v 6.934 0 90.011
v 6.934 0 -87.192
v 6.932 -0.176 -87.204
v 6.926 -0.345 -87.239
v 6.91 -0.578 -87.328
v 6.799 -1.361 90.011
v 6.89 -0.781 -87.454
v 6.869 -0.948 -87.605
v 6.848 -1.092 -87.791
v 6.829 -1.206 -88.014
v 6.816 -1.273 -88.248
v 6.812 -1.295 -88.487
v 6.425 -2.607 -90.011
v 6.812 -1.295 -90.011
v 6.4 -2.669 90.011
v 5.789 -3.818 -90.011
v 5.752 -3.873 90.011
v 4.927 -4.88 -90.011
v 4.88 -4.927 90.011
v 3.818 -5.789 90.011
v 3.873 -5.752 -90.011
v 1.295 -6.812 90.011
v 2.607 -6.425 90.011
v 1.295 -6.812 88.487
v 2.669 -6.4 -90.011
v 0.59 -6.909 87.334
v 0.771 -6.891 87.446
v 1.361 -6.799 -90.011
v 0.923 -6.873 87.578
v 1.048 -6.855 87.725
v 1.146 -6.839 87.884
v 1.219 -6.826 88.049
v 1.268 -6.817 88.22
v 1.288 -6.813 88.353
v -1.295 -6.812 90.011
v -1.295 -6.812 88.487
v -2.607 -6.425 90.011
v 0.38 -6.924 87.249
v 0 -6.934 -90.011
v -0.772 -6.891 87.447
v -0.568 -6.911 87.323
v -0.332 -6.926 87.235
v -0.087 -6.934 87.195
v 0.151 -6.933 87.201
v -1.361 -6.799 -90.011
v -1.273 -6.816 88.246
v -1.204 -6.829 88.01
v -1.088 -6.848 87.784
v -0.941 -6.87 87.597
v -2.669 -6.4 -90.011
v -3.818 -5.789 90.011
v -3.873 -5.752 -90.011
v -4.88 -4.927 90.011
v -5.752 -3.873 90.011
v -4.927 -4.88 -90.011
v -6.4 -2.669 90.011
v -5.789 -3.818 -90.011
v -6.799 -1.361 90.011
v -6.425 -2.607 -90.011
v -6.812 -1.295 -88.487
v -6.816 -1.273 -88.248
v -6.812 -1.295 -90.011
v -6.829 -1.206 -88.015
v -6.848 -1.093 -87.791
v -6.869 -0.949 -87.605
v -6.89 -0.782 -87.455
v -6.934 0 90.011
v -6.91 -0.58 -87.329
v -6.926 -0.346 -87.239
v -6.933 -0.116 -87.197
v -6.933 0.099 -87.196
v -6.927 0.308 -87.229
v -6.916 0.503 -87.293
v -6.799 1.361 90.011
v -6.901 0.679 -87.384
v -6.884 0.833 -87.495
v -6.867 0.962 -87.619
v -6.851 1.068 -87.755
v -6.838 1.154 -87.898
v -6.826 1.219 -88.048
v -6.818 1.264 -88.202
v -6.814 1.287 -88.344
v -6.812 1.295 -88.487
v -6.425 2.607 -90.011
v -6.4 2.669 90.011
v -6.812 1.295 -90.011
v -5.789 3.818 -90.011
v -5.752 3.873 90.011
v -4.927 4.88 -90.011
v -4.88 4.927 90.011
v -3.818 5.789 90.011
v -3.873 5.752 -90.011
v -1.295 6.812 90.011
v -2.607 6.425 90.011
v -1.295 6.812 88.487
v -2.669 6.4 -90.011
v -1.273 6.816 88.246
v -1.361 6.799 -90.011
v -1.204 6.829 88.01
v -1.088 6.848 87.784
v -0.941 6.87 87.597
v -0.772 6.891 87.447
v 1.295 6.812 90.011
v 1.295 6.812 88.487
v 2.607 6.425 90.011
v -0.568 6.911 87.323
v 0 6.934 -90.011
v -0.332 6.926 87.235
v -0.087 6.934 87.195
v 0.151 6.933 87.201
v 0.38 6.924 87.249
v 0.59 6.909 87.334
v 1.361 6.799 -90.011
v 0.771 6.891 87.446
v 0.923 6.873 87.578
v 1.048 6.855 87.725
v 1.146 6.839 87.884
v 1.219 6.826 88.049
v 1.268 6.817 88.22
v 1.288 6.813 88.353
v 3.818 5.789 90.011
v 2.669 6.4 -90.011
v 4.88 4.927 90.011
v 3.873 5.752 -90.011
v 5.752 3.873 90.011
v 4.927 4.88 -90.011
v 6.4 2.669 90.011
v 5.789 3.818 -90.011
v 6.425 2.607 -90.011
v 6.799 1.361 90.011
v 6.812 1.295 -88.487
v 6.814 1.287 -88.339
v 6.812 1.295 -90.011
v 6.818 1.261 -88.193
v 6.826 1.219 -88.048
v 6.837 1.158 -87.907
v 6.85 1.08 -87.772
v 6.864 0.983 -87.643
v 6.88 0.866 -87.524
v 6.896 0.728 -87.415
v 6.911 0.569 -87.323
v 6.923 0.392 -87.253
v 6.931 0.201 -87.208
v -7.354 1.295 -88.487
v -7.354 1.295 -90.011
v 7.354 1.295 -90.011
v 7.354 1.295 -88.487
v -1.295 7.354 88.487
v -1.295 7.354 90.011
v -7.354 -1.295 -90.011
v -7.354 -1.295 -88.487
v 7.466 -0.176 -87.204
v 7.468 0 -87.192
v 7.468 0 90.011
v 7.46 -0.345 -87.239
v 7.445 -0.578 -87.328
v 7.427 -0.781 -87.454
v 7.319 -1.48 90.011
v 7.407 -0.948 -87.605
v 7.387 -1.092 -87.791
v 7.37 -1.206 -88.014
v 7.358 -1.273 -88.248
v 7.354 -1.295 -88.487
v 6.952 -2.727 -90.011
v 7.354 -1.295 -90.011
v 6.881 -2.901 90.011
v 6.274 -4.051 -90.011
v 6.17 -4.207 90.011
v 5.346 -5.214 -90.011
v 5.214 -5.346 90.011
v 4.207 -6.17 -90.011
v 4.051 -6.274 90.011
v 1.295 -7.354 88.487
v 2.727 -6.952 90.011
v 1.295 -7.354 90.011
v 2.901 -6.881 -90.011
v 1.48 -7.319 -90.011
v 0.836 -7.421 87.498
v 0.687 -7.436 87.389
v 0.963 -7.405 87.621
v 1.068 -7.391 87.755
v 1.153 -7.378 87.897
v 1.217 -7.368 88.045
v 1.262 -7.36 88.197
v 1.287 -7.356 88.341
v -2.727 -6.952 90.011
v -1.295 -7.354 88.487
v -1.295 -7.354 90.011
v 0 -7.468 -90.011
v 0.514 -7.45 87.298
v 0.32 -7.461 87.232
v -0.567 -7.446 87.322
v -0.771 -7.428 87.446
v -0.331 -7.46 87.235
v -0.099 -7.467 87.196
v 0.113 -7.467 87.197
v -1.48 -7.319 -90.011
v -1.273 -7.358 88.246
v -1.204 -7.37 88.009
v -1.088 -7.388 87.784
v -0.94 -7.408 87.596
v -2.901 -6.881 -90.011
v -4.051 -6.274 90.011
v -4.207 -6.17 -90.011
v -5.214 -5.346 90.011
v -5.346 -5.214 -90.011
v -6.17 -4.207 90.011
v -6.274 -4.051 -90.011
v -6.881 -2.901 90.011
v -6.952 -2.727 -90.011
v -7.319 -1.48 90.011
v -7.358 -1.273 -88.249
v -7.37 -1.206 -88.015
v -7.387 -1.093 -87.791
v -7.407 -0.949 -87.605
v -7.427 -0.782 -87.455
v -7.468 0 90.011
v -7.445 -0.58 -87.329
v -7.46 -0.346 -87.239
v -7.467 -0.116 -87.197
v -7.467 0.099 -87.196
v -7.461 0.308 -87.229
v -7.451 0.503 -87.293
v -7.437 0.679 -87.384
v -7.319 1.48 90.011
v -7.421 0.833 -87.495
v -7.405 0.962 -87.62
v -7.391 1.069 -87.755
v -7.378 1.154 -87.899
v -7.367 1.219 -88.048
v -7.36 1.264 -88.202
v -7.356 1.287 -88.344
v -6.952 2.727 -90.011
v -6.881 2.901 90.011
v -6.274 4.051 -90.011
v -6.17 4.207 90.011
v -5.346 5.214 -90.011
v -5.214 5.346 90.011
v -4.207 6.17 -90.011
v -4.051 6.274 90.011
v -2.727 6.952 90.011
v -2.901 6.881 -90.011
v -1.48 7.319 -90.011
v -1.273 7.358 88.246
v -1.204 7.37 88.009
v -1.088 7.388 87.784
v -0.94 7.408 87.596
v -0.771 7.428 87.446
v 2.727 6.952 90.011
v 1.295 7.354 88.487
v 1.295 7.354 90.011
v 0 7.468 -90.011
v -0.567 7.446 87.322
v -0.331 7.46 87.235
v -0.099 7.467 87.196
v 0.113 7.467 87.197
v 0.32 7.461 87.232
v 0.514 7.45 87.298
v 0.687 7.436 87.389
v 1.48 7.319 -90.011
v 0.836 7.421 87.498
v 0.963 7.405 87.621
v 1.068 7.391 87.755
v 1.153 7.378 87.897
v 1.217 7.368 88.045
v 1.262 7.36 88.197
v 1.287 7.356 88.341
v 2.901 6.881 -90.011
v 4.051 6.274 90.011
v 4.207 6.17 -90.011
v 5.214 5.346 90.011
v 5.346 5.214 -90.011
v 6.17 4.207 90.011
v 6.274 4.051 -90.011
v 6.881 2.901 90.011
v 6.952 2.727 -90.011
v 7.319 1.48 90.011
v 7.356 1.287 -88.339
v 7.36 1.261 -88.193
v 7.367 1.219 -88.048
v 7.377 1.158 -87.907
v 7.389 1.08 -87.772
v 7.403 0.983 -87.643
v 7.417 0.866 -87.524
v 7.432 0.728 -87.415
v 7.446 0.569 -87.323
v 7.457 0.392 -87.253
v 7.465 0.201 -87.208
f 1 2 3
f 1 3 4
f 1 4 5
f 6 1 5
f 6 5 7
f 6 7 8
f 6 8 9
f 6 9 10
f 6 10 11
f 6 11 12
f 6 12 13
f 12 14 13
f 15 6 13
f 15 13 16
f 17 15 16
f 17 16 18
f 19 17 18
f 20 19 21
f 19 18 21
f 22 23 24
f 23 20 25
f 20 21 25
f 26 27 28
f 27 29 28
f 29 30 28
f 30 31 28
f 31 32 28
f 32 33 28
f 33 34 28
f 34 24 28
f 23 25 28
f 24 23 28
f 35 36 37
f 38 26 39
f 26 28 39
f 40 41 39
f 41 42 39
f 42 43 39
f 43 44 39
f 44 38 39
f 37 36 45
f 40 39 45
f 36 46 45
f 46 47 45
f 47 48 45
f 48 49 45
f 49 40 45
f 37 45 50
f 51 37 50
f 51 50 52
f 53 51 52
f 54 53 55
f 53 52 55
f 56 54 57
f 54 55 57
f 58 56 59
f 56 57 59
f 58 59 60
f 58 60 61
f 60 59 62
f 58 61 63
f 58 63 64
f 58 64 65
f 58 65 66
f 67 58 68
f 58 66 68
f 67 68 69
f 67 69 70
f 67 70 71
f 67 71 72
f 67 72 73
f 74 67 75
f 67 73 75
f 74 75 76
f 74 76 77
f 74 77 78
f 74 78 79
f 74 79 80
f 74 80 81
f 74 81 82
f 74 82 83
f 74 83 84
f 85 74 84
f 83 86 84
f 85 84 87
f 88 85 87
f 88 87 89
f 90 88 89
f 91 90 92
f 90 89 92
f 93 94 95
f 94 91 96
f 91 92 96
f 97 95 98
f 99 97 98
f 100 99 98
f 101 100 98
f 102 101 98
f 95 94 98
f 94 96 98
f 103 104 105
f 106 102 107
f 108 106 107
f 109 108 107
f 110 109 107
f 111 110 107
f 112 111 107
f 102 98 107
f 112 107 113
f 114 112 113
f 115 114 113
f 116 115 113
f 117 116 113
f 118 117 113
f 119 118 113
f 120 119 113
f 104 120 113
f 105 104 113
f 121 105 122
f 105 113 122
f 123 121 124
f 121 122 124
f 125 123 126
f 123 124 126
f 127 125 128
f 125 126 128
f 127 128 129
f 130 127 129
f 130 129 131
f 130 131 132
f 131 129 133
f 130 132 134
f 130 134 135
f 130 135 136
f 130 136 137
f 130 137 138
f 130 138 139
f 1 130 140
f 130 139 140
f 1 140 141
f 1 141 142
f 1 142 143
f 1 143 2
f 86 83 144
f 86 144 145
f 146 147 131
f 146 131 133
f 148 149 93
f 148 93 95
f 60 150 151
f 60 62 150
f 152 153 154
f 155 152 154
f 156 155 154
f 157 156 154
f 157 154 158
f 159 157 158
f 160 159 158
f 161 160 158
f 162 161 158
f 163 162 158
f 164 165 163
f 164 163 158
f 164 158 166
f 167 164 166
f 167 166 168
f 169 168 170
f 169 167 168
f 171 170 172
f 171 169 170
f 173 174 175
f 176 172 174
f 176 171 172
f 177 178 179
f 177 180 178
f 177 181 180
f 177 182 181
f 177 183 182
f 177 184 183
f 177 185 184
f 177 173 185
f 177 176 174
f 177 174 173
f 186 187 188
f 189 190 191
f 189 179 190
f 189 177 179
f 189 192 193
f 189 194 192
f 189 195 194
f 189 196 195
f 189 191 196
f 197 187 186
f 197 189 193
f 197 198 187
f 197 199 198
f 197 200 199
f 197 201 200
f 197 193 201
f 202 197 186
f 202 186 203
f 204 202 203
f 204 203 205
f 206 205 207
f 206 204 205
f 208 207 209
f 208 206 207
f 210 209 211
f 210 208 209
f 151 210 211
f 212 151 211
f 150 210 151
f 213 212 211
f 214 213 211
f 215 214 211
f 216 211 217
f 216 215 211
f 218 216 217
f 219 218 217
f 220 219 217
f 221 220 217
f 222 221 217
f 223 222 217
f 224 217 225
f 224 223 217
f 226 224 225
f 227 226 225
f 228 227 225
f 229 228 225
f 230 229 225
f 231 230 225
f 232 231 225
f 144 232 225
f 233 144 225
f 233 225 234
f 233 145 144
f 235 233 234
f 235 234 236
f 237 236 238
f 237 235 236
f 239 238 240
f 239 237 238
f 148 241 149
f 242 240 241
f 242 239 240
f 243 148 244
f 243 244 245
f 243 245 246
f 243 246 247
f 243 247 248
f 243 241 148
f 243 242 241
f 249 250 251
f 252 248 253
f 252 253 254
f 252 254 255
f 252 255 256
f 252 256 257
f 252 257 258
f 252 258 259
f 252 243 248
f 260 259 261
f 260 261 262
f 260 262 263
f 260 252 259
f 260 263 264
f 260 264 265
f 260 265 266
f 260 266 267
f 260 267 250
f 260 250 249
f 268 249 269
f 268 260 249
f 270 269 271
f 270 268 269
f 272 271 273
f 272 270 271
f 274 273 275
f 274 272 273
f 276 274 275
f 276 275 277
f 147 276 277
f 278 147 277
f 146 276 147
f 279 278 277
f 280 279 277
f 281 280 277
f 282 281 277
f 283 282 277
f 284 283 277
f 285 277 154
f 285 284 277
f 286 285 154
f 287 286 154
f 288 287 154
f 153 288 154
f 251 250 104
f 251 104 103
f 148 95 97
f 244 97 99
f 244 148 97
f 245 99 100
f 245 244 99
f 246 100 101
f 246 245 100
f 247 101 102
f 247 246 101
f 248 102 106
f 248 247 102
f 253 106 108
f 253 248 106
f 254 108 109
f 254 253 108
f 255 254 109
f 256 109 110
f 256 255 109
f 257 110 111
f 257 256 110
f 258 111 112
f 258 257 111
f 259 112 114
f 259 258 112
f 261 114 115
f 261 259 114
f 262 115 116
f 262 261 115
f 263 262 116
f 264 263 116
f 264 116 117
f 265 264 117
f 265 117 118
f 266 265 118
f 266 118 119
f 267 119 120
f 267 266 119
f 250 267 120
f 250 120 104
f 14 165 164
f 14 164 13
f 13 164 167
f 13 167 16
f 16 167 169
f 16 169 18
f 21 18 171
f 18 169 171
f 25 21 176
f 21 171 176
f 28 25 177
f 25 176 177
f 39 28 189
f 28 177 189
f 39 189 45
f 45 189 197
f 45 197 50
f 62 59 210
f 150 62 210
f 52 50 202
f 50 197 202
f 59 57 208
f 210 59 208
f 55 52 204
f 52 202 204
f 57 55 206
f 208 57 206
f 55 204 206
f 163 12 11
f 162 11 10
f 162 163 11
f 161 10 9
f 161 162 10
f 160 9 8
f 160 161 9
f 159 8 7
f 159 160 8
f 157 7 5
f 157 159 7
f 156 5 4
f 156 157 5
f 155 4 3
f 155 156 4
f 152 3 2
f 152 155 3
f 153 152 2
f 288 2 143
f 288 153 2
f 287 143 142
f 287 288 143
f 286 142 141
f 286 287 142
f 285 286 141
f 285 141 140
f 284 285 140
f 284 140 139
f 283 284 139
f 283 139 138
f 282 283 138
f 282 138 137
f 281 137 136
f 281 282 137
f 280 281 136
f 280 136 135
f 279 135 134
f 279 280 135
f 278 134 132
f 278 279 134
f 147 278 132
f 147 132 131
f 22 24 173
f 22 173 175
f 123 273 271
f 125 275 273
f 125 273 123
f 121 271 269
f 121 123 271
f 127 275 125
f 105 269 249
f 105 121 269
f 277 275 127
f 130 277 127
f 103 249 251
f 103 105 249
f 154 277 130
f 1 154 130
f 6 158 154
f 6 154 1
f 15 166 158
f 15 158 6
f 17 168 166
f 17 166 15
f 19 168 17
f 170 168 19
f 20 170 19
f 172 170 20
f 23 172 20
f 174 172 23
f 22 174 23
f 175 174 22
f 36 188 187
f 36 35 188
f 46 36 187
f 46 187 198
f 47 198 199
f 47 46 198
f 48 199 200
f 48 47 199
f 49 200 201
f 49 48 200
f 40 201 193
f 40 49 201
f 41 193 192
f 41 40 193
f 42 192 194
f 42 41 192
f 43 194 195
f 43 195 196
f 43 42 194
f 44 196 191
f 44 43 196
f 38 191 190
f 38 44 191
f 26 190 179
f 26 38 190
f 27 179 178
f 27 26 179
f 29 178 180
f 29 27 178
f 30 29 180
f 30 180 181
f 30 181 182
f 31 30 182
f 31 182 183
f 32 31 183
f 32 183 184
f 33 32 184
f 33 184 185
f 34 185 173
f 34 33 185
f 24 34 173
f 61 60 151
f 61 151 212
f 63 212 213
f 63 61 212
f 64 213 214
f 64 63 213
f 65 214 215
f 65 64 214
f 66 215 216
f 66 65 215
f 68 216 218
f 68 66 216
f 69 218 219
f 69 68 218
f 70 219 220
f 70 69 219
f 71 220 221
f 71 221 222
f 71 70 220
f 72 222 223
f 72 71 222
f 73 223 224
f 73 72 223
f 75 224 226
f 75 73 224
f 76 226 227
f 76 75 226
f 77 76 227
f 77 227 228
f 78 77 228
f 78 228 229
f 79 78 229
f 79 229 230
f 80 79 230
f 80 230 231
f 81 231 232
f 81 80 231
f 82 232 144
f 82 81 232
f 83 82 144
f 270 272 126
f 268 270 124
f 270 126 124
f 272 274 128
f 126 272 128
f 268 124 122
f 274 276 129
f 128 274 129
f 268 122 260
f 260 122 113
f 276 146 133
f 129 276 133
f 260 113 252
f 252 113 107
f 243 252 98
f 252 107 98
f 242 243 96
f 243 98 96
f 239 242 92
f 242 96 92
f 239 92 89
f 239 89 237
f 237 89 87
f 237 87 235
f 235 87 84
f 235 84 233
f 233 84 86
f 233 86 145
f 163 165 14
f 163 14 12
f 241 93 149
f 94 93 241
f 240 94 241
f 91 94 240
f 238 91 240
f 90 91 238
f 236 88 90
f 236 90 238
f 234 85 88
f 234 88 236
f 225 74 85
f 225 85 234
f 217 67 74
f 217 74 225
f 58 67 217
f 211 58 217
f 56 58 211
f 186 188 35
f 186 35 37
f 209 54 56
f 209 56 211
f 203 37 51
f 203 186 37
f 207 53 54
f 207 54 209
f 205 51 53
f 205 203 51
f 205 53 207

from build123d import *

# Parameters (mm, degrees)
SKETCH1_W          = 300.0375
SKETCH1_H          = 0.889
CUT_EXTRUDE1_DEPTH = 12.7
CUT_EXTRUDE2_DEPTH = 12.7
SCALE1_SCALE       = 0.6


with BuildPart() as part:
    # Sketch1 → Revolve1 (revolve)
    with BuildSketch(Plane(origin=(0, 0, 0), x_dir=(0, 0, -1), z_dir=(1, 0, 0)), mode=Mode.PRIVATE) as revolve1_sk:
        with Locations((0, 12.0015)):
            Rectangle(SKETCH1_W, SKETCH1_H)
    revolve(revolve1_sk.sketch.rotate(Axis((0, 0, 90.675886036), (0, 0, -1)), 90), axis=Axis((0, 0, 90.675886036), (0, 0, -1)))

    # Sketch2 → Cut-Extrude1 (cut, symmetric)
    with BuildSketch(Plane(origin=(0, 0, 0), x_dir=(1, 0, 0), z_dir=(0, 1, 0))):
        with BuildLine():
            Line((-2.159, -155.09875), (-2.159, -147.47875))
            ThreePointArc((-2.159, -147.47875), (0, -145.31975), (2.159, -147.47875))
            Line((2.159, -147.47875), (2.159, -155.09875))
            ThreePointArc((2.159, -155.09875), (0, -157.25775), (-2.159, -155.09875))
        make_face()
    extrude(amount=CUT_EXTRUDE1_DEPTH, both=True, mode=Mode.SUBTRACT)

    # Sketch3 → Cut-Extrude2 (cut, symmetric)
    with BuildSketch(Plane(origin=(0, 0, 0), x_dir=(0, 0, -1), z_dir=(1, 0, 0))):
        with BuildLine():
            Line((155.09875, -2.159), (147.47875, -2.159))
            ThreePointArc((147.47875, -2.159), (145.31975, 0), (147.47875, 2.159))
            Line((147.47875, 2.159), (155.09875, 2.159))
            ThreePointArc((155.09875, 2.159), (157.25775, 0), (155.09875, -2.159))
        make_face()
    extrude(amount=CUT_EXTRUDE2_DEPTH, both=True, mode=Mode.SUBTRACT)


with BuildPart() as part_1:
    # Scale1: scaled about (-1.267e-06, -7.59e-07, -4.795e-06)
    add(part.part.scale(SCALE1_SCALE).moved(Location((-5.07e-07, -3.04e-07, -1.918e-06))))


solid = part_1.part
